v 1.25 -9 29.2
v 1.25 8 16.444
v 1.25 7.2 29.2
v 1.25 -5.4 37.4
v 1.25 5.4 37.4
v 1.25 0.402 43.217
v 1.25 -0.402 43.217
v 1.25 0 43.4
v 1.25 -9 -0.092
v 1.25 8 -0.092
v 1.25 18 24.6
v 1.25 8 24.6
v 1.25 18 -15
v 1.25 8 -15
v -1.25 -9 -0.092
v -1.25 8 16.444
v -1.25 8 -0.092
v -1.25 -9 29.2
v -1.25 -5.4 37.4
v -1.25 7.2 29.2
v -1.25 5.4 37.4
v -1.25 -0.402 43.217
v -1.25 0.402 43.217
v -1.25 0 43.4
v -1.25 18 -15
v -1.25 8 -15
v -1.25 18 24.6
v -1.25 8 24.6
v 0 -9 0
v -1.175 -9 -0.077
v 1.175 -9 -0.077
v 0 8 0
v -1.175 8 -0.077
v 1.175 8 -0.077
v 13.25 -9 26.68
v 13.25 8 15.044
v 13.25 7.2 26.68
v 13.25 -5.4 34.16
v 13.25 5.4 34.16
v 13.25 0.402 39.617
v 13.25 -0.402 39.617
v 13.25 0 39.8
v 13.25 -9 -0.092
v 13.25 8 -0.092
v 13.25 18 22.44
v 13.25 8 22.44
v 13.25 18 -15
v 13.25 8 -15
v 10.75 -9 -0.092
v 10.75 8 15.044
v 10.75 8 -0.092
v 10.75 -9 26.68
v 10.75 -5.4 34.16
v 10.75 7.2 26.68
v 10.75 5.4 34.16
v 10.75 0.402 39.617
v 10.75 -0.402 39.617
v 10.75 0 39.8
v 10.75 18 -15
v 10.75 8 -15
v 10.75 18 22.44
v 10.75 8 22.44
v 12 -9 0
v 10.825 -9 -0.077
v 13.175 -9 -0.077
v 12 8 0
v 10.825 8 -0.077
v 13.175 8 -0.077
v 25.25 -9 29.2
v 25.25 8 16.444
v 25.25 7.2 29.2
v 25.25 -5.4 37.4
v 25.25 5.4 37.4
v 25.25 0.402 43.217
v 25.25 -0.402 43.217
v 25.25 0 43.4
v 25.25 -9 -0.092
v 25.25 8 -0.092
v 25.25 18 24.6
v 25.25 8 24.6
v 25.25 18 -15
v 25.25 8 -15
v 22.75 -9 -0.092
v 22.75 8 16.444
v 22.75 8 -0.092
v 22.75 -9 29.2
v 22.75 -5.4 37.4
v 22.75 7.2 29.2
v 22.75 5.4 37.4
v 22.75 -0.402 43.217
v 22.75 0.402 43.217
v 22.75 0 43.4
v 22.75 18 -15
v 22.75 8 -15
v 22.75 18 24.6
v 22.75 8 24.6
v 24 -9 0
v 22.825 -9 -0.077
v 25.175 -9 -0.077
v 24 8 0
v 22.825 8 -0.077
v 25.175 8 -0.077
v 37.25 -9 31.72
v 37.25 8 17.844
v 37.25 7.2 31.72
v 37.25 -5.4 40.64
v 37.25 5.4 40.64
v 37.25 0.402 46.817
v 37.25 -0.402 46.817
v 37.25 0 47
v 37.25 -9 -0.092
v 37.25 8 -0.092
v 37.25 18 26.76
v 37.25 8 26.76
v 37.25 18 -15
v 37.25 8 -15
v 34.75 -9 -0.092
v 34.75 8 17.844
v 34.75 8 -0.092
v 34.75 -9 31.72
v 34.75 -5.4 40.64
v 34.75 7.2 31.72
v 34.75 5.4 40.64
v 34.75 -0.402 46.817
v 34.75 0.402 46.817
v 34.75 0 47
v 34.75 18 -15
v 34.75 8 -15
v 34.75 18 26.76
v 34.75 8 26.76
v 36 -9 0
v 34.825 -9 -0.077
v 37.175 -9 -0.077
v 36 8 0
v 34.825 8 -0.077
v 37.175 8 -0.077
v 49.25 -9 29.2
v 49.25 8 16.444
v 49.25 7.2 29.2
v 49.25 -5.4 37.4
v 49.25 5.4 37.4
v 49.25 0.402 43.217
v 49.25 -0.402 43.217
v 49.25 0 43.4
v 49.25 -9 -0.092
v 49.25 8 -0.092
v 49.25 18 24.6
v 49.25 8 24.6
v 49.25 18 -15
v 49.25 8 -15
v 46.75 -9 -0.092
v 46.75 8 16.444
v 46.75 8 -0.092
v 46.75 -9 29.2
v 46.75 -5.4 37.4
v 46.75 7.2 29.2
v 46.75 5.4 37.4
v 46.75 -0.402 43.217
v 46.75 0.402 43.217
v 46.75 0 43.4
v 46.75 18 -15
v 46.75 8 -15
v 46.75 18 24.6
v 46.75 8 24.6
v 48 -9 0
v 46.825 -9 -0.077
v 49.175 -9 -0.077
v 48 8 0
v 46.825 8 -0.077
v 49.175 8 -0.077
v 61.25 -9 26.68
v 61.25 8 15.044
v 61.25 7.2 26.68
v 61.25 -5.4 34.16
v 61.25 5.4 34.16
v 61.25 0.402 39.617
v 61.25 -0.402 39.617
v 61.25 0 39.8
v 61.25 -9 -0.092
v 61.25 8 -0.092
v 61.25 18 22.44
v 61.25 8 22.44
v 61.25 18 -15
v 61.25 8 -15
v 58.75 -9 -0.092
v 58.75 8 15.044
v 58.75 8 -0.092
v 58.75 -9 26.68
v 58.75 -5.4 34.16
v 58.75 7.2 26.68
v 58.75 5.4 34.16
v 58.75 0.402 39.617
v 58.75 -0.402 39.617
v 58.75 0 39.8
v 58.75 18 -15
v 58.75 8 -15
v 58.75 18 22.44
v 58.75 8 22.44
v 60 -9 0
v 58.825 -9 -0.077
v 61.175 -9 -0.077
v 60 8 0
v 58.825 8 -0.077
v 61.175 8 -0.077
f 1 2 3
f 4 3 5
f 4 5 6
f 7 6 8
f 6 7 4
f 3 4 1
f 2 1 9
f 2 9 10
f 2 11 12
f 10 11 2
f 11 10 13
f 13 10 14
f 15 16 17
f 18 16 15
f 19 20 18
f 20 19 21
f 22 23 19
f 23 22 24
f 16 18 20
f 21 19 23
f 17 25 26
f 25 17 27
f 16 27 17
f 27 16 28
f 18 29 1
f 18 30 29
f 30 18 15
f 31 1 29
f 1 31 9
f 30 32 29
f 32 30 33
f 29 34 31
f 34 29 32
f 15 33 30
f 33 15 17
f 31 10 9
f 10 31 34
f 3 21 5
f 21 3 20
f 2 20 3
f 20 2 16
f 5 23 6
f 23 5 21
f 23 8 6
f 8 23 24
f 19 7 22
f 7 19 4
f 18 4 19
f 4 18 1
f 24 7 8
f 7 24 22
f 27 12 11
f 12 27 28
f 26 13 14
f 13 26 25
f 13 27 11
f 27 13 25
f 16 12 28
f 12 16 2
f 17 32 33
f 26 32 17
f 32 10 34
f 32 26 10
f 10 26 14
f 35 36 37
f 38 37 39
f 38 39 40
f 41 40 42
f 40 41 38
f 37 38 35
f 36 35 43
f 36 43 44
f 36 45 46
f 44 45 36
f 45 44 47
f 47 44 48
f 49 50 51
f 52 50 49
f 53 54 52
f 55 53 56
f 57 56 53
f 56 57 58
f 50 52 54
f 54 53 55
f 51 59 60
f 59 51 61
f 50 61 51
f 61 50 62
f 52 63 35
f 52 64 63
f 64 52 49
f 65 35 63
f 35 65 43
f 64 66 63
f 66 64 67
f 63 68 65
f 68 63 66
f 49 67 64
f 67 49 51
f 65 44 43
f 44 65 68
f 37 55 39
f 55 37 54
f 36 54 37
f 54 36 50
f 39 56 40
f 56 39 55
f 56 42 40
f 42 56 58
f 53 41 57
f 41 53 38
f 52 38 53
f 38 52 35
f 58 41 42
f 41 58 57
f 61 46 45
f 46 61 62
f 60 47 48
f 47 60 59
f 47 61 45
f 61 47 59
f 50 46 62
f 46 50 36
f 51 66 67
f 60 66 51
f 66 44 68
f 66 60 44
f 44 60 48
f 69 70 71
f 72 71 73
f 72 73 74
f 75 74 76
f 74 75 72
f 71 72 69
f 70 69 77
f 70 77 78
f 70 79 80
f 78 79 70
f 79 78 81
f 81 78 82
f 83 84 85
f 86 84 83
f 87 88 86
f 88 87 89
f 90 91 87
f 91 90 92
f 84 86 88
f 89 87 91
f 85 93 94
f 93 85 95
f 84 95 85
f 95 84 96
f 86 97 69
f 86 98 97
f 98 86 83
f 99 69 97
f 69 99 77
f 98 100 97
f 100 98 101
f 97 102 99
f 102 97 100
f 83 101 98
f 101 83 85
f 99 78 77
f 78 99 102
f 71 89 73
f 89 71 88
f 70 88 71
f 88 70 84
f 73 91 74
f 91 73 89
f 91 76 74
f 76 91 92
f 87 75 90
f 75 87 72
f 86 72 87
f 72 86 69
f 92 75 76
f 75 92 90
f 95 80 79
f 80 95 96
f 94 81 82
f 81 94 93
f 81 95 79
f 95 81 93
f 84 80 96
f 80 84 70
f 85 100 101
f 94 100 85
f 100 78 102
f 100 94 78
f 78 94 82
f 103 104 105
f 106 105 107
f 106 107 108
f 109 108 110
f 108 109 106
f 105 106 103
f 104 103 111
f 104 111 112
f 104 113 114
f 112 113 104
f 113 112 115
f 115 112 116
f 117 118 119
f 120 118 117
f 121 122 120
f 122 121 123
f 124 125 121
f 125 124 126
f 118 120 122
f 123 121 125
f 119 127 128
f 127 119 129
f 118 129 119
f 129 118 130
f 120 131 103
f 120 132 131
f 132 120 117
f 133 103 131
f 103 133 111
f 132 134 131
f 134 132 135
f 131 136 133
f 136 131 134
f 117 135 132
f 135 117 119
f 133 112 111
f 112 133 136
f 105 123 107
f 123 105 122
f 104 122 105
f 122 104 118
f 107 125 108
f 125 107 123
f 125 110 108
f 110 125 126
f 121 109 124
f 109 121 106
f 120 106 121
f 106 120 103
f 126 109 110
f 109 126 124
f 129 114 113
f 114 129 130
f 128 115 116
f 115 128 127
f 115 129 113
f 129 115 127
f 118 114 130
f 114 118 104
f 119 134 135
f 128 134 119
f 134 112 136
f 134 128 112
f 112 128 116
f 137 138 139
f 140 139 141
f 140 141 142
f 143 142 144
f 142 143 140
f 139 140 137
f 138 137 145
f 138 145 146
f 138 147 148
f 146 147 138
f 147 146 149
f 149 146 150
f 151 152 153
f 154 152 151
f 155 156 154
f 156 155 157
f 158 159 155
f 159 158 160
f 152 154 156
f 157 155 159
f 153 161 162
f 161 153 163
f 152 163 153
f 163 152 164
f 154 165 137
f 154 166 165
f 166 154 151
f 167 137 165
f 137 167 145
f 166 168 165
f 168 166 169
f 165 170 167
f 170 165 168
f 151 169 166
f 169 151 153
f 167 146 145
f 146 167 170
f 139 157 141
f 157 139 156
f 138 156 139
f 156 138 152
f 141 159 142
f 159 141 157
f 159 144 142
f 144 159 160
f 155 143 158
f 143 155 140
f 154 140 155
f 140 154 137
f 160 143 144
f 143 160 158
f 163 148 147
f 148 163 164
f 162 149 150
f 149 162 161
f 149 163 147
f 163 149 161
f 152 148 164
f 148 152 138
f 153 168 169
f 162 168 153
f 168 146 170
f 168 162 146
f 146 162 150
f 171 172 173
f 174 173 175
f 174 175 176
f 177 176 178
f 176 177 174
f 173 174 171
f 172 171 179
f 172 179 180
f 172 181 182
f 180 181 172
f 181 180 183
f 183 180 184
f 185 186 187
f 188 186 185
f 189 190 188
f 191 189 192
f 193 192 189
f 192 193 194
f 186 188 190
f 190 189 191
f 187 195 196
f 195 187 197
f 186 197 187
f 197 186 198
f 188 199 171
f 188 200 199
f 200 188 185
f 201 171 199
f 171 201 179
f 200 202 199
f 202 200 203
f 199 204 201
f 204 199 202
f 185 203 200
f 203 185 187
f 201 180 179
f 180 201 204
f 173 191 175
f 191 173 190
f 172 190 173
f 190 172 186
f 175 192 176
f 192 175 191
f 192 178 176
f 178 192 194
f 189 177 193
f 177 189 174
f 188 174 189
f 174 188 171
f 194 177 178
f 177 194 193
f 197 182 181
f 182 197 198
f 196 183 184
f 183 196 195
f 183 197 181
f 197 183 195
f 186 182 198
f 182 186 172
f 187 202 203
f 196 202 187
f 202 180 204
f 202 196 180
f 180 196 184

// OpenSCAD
// file: ../common.scad
/*
 * WAVE OCEAN V10 - VERTICAL SLAT SYSTEM V2
 * COMMON PARAMETERS
 *
 * DESIGN PRINCIPLES:
 * - TRUE TRAVELING WAVE (not synchronized bobbing)
 * - Maximum slats with minimum spacing
 * - 2 cam ridges = 2 visible waves traveling across
 * - Clean minimal slat design
 *
 * KEY INSIGHT:
 * For traveling wave: NUM_RIDGES << NUM_SLATS
 * Each slat experiences different phase of the wave
 *
 * All dimensions in mm
 */

// ============================================
// PRINT TOLERANCES (FDM tuned)
// ============================================

TOL_CLEARANCE = 0.2;         // Shaft in hole
TOL_SLIDING = 0.3;           // Slat in groove
TOL_PRESS_FIT = -0.1;        // Bearing press-fit

// ============================================
// HARDWARE SPECIFICATIONS
// ============================================

// 608 Bearing (main shaft)
BEARING_608_ID = 8;
BEARING_608_OD = 22;
BEARING_608_H = 7;

// Main shaft
SHAFT_DIA = 8;
SHAFT_HOLE = SHAFT_DIA + TOL_CLEARANCE;  // 8.2mm

// Fasteners
M3_HOLE = 3.2;
M3_HEAD_DIA = 5.5;
M3_HEAD_H = 3;
M4_HOLE = 4.2;
M4_HEAD_DIA = 7;

// ============================================
// SLAT CONFIGURATION - MAXIMIZED
// ============================================

// Slat dimensions (THIN for tight packing)
SLAT_THICKNESS = 2.5;                // X dimension - very thin
SLAT_DEPTH = 18;                     // Y dimension (front to back)

// Spacing calculation
// Minimum = thickness + clearance for movement
SLAT_CLEARANCE = 2.5;                // Gap between slats
SLAT_SPACING = SLAT_THICKNESS + SLAT_CLEARANCE;  // 5mm

// Cam and slat count
CAM_LENGTH = 180;                    // Active cam length
NUM_SLATS = floor(CAM_LENGTH / SLAT_SPACING);  // 36 slats!

// Height variations
SLAT_BASE_HEIGHT = 35;               // Minimum height
SLAT_HEIGHT_VARIATION = 12;          // Max additional height

// Height pattern: gradual variation for organic look
function slat_height(i) =
    SLAT_BASE_HEIGHT + SLAT_HEIGHT_VARIATION *
    (0.5 + 0.3 * sin(i * 45) + 0.2 * sin(i * 90));

// Back tab for groove guidance
TAB_THICKNESS = SLAT_THICKNESS;      // Same as slat
TAB_DEPTH = 10;                      // Into backplate
TAB_EXTRA_HEIGHT = 15;               // Below slat body

// Cam follower (curved bottom)
FOLLOWER_HEIGHT = 5;

// ============================================
// CAM CONFIGURATION - TRAVELING WAVE
// ============================================

// KEY: Few ridges = traveling wave effect
// 2 ridges = 2 complete waves visible at any time
NUM_RIDGES = 2;                      // Only 2 ridges!

CAM_CORE_RADIUS = 8;                 // Smaller core
CAM_RIDGE_HEIGHT = 10;               // Wave amplitude
CAM_MAX_RADIUS = CAM_CORE_RADIUS + CAM_RIDGE_HEIGHT;  // 18mm

// Helix: 2 turns over cam length = 2 ridges
HELIX_TURNS = NUM_RIDGES;            // 2 turns

// Follower curve matches cam
FOLLOWER_CURVE_RADIUS = CAM_CORE_RADIUS + 1;

// ============================================
// PHASE CALCULATION - THE KEY TO TRAVELING WAVE
// ============================================

// Slat X position (centered, evenly spaced)
function slat_x(i) = (i - (NUM_SLATS - 1) / 2) * SLAT_SPACING;

// Phase at slat position
// This determines WHERE on the wave cycle this slat is
function slat_phase(i, theta) =
    let(x = slat_x(i))
    // Helix angle based on position along cam
    let(helix_angle = ((x + CAM_LENGTH/2) / CAM_LENGTH) * 360 * HELIX_TURNS)
    // Add cam rotation
    helix_angle + theta;

// Cam surface height at slat position
// Uses cosine for smooth wave: 1 at peak, -1 at trough
function cam_surface_at_slat(i, theta) =
    let(phase = slat_phase(i, theta))
    CAM_CORE_RADIUS + CAM_RIDGE_HEIGHT * (0.5 + 0.5 * cos(phase));

// Slat Z position (bottom of slat rests on cam)
function slat_z(i, theta) =
    CAM_CENTER_Z + cam_surface_at_slat(i, theta);

// ============================================
// BACKPLATE CONFIGURATION
// ============================================

BACKPLATE_WIDTH = CAM_LENGTH + 30;   // 210mm
BACKPLATE_HEIGHT = 70;               // Enough for travel + slat height
BACKPLATE_THICKNESS = 12;            // Structural

// Groove dimensions
GROOVE_WIDTH = TAB_THICKNESS + TOL_SLIDING;  // 2.8mm
GROOVE_DEPTH = TAB_DEPTH + 2;                 // 12mm

// ============================================
// BEARING BLOCK CONFIGURATION
// ============================================

BB_WIDTH = 28;
BB_DEPTH = 28;
BB_HEIGHT = CAM_MAX_RADIUS + 8;      // 26mm

BEARING_POCKET_DIA = BEARING_608_OD - TOL_PRESS_FIT;  // 22.1mm
BEARING_POCKET_DEPTH = BEARING_608_H + 0.5;

// ============================================
// ASSEMBLY POSITIONS
// ============================================

// Cam center height (shaft axis)
CAM_CENTER_Z = BB_HEIGHT;            // 26mm above base

// Backplate position
BACKPLATE_Y = SLAT_DEPTH / 2 + 2;    // Behind slats
BACKPLATE_Z = 0;                     // Starts at base

// Bearing block X positions
BB_LEFT_X = -CAM_LENGTH / 2 - BB_WIDTH / 2 - 5;
BB_RIGHT_X = CAM_LENGTH / 2 + BB_WIDTH / 2 + 5;

// Shaft length
SHAFT_LENGTH = CAM_LENGTH + BB_WIDTH * 2 + 40;

// ============================================
// COLORS
// ============================================

C_SLAT = [0.15, 0.4, 0.7];           // Ocean blue
C_CAM = [0.65, 0.5, 0.3];            // Wood brown
C_BACKPLATE = [0.2, 0.18, 0.15];     // Dark wood
C_BB = [0.35, 0.35, 0.4];            // Gray
C_SHAFT = [0.6, 0.6, 0.65];          // Steel

// Slat color gradient (wave-like coloring)
function slat_color(i) =
    let(t = (sin(i * 360 / NUM_SLATS) + 1) / 2)  // 0 to 1 wave pattern
    [0.08 + 0.12*t, 0.25 + 0.2*t, 0.5 + 0.3*t];

// ============================================
// VERIFICATION
// ============================================

echo("============================================");
echo("  VERTICAL SLAT SYSTEM V2 - TRAVELING WAVE");
echo("============================================");
echo("");
echo("SLAT CONFIGURATION:");
echo(str("  Number of slats: ", NUM_SLATS));
echo(str("  Slat thickness: ", SLAT_THICKNESS, "mm"));
echo(str("  Slat spacing: ", SLAT_SPACING, "mm"));
echo(str("  Gap between slats: ", SLAT_CLEARANCE, "mm"));
echo("");
echo("CAM CONFIGURATION:");
echo(str("  Cam ridges: ", NUM_RIDGES, " (creates ", NUM_RIDGES, " traveling waves)"));
echo(str("  Slats per wave: ", NUM_SLATS / NUM_RIDGES));
echo(str("  Phase between adjacent slats: ", 360 * HELIX_TURNS / NUM_SLATS, "°"));
echo("");
echo("WAVE MOTION:");
echo(str("  Amplitude: ", CAM_RIDGE_HEIGHT, "mm"));
echo(str("  Core radius: ", CAM_CORE_RADIUS, "mm"));
echo("");
echo("This creates a TRUE traveling wave where adjacent");
echo("slats are at different phases of the wave cycle.");

// ============================================
// QUALITY SETTING
// ============================================

$fn = 48;
// main file
/*
 * SLAT - Clean Minimal Wave Profile
 *
 * Printable part: 36x (varying heights)
 * Print orientation: Upright (Z up)
 *
 * DESIGN:
 * - Ultra-thin (2.5mm) for tight packing
 * - Clean smooth profile - no protrusions
 * - Back tab slides in backplate groove
 * - Curved bottom rides on cam
 *
 * All slats same SHAPE, different HEIGHTS
 */

include <../common.scad>

$fn = 32;

// ============================================
// PARAMETRIC SLAT MODULE
// ============================================

module slat(height = SLAT_BASE_HEIGHT) {
    union() {
        // Main wave body
        wave_body(height);

        // Back tab for groove guidance
        back_tab(height);

        // Cam follower bottom
        cam_follower();
    }
}

// ============================================
// WAVE BODY - Clean tapered profile
// ============================================

module wave_body(height) {
    // Simple elegant wave shape
    // Smooth taper to rounded crest

    hull() {
        // Base - full width
        translate([-SLAT_THICKNESS/2, -SLAT_DEPTH/2, 0])
            cube([SLAT_THICKNESS, SLAT_DEPTH, 0.5]);

        // Mid section
        translate([-SLAT_THICKNESS/2, -SLAT_DEPTH/2, height * 0.7])
            cube([SLAT_THICKNESS, SLAT_DEPTH * 0.9, 0.5]);

        // Upper taper
        translate([-SLAT_THICKNESS/2, -SLAT_DEPTH * 0.3, height * 0.9])
            cube([SLAT_THICKNESS, SLAT_DEPTH * 0.6, 0.5]);

        // Crest - simple rounded top
        translate([0, 0, height])
        scale([1, 0.35, 0.8])
        rotate([0, 90, 0])
            cylinder(d = 6, h = SLAT_THICKNESS, center = true, $fn = 16);
    }
}

// ============================================
// BACK TAB - Groove guidance
// ============================================

module back_tab(height) {
    // Tab extends from back of slat into backplate groove

    tab_bottom = -TAB_EXTRA_HEIGHT;
    tab_top = height * 0.6;
    tab_height = tab_top - tab_bottom;

    translate([-TAB_THICKNESS/2, SLAT_DEPTH/2 - 1, tab_bottom])
        cube([TAB_THICKNESS, TAB_DEPTH, tab_height]);
}

// ============================================
// CAM FOLLOWER - Curved bottom
// ============================================

module cam_follower() {
    // Concave bottom that rides on cam surface

    translate([0, 0, -FOLLOWER_HEIGHT])
    difference() {
        // Solid base
        translate([-SLAT_THICKNESS/2, -SLAT_DEPTH/2, 0])
            cube([SLAT_THICKNESS, SLAT_DEPTH, FOLLOWER_HEIGHT + 0.5]);

        // Concave curve
        translate([0, 0, -FOLLOWER_CURVE_RADIUS + FOLLOWER_HEIGHT])
        rotate([90, 0, 0])
            cylinder(r = FOLLOWER_CURVE_RADIUS, h = SLAT_DEPTH + 2, center = true, $fn = 48);
    }
}

// ============================================
// RENDER - Show sample slats
// ============================================

// Display a few slats showing height variation
for (i = [0 : 5]) {
    translate([i * 12, 0, 0])
    color(slat_color(i * 6))
        slat(slat_height(i * 6));
}

// ============================================
// INFO
// ============================================

echo("=== SLAT ===");
echo(str("Thickness: ", SLAT_THICKNESS, "mm"));
echo(str("Depth: ", SLAT_DEPTH, "mm"));
echo(str("Height range: ", SLAT_BASE_HEIGHT, "-", SLAT_BASE_HEIGHT + SLAT_HEIGHT_VARIATION, "mm"));
echo(str("Total slats: ", NUM_SLATS));
echo("");
echo("Print all slats - heights calculated from slat_height(i)");
